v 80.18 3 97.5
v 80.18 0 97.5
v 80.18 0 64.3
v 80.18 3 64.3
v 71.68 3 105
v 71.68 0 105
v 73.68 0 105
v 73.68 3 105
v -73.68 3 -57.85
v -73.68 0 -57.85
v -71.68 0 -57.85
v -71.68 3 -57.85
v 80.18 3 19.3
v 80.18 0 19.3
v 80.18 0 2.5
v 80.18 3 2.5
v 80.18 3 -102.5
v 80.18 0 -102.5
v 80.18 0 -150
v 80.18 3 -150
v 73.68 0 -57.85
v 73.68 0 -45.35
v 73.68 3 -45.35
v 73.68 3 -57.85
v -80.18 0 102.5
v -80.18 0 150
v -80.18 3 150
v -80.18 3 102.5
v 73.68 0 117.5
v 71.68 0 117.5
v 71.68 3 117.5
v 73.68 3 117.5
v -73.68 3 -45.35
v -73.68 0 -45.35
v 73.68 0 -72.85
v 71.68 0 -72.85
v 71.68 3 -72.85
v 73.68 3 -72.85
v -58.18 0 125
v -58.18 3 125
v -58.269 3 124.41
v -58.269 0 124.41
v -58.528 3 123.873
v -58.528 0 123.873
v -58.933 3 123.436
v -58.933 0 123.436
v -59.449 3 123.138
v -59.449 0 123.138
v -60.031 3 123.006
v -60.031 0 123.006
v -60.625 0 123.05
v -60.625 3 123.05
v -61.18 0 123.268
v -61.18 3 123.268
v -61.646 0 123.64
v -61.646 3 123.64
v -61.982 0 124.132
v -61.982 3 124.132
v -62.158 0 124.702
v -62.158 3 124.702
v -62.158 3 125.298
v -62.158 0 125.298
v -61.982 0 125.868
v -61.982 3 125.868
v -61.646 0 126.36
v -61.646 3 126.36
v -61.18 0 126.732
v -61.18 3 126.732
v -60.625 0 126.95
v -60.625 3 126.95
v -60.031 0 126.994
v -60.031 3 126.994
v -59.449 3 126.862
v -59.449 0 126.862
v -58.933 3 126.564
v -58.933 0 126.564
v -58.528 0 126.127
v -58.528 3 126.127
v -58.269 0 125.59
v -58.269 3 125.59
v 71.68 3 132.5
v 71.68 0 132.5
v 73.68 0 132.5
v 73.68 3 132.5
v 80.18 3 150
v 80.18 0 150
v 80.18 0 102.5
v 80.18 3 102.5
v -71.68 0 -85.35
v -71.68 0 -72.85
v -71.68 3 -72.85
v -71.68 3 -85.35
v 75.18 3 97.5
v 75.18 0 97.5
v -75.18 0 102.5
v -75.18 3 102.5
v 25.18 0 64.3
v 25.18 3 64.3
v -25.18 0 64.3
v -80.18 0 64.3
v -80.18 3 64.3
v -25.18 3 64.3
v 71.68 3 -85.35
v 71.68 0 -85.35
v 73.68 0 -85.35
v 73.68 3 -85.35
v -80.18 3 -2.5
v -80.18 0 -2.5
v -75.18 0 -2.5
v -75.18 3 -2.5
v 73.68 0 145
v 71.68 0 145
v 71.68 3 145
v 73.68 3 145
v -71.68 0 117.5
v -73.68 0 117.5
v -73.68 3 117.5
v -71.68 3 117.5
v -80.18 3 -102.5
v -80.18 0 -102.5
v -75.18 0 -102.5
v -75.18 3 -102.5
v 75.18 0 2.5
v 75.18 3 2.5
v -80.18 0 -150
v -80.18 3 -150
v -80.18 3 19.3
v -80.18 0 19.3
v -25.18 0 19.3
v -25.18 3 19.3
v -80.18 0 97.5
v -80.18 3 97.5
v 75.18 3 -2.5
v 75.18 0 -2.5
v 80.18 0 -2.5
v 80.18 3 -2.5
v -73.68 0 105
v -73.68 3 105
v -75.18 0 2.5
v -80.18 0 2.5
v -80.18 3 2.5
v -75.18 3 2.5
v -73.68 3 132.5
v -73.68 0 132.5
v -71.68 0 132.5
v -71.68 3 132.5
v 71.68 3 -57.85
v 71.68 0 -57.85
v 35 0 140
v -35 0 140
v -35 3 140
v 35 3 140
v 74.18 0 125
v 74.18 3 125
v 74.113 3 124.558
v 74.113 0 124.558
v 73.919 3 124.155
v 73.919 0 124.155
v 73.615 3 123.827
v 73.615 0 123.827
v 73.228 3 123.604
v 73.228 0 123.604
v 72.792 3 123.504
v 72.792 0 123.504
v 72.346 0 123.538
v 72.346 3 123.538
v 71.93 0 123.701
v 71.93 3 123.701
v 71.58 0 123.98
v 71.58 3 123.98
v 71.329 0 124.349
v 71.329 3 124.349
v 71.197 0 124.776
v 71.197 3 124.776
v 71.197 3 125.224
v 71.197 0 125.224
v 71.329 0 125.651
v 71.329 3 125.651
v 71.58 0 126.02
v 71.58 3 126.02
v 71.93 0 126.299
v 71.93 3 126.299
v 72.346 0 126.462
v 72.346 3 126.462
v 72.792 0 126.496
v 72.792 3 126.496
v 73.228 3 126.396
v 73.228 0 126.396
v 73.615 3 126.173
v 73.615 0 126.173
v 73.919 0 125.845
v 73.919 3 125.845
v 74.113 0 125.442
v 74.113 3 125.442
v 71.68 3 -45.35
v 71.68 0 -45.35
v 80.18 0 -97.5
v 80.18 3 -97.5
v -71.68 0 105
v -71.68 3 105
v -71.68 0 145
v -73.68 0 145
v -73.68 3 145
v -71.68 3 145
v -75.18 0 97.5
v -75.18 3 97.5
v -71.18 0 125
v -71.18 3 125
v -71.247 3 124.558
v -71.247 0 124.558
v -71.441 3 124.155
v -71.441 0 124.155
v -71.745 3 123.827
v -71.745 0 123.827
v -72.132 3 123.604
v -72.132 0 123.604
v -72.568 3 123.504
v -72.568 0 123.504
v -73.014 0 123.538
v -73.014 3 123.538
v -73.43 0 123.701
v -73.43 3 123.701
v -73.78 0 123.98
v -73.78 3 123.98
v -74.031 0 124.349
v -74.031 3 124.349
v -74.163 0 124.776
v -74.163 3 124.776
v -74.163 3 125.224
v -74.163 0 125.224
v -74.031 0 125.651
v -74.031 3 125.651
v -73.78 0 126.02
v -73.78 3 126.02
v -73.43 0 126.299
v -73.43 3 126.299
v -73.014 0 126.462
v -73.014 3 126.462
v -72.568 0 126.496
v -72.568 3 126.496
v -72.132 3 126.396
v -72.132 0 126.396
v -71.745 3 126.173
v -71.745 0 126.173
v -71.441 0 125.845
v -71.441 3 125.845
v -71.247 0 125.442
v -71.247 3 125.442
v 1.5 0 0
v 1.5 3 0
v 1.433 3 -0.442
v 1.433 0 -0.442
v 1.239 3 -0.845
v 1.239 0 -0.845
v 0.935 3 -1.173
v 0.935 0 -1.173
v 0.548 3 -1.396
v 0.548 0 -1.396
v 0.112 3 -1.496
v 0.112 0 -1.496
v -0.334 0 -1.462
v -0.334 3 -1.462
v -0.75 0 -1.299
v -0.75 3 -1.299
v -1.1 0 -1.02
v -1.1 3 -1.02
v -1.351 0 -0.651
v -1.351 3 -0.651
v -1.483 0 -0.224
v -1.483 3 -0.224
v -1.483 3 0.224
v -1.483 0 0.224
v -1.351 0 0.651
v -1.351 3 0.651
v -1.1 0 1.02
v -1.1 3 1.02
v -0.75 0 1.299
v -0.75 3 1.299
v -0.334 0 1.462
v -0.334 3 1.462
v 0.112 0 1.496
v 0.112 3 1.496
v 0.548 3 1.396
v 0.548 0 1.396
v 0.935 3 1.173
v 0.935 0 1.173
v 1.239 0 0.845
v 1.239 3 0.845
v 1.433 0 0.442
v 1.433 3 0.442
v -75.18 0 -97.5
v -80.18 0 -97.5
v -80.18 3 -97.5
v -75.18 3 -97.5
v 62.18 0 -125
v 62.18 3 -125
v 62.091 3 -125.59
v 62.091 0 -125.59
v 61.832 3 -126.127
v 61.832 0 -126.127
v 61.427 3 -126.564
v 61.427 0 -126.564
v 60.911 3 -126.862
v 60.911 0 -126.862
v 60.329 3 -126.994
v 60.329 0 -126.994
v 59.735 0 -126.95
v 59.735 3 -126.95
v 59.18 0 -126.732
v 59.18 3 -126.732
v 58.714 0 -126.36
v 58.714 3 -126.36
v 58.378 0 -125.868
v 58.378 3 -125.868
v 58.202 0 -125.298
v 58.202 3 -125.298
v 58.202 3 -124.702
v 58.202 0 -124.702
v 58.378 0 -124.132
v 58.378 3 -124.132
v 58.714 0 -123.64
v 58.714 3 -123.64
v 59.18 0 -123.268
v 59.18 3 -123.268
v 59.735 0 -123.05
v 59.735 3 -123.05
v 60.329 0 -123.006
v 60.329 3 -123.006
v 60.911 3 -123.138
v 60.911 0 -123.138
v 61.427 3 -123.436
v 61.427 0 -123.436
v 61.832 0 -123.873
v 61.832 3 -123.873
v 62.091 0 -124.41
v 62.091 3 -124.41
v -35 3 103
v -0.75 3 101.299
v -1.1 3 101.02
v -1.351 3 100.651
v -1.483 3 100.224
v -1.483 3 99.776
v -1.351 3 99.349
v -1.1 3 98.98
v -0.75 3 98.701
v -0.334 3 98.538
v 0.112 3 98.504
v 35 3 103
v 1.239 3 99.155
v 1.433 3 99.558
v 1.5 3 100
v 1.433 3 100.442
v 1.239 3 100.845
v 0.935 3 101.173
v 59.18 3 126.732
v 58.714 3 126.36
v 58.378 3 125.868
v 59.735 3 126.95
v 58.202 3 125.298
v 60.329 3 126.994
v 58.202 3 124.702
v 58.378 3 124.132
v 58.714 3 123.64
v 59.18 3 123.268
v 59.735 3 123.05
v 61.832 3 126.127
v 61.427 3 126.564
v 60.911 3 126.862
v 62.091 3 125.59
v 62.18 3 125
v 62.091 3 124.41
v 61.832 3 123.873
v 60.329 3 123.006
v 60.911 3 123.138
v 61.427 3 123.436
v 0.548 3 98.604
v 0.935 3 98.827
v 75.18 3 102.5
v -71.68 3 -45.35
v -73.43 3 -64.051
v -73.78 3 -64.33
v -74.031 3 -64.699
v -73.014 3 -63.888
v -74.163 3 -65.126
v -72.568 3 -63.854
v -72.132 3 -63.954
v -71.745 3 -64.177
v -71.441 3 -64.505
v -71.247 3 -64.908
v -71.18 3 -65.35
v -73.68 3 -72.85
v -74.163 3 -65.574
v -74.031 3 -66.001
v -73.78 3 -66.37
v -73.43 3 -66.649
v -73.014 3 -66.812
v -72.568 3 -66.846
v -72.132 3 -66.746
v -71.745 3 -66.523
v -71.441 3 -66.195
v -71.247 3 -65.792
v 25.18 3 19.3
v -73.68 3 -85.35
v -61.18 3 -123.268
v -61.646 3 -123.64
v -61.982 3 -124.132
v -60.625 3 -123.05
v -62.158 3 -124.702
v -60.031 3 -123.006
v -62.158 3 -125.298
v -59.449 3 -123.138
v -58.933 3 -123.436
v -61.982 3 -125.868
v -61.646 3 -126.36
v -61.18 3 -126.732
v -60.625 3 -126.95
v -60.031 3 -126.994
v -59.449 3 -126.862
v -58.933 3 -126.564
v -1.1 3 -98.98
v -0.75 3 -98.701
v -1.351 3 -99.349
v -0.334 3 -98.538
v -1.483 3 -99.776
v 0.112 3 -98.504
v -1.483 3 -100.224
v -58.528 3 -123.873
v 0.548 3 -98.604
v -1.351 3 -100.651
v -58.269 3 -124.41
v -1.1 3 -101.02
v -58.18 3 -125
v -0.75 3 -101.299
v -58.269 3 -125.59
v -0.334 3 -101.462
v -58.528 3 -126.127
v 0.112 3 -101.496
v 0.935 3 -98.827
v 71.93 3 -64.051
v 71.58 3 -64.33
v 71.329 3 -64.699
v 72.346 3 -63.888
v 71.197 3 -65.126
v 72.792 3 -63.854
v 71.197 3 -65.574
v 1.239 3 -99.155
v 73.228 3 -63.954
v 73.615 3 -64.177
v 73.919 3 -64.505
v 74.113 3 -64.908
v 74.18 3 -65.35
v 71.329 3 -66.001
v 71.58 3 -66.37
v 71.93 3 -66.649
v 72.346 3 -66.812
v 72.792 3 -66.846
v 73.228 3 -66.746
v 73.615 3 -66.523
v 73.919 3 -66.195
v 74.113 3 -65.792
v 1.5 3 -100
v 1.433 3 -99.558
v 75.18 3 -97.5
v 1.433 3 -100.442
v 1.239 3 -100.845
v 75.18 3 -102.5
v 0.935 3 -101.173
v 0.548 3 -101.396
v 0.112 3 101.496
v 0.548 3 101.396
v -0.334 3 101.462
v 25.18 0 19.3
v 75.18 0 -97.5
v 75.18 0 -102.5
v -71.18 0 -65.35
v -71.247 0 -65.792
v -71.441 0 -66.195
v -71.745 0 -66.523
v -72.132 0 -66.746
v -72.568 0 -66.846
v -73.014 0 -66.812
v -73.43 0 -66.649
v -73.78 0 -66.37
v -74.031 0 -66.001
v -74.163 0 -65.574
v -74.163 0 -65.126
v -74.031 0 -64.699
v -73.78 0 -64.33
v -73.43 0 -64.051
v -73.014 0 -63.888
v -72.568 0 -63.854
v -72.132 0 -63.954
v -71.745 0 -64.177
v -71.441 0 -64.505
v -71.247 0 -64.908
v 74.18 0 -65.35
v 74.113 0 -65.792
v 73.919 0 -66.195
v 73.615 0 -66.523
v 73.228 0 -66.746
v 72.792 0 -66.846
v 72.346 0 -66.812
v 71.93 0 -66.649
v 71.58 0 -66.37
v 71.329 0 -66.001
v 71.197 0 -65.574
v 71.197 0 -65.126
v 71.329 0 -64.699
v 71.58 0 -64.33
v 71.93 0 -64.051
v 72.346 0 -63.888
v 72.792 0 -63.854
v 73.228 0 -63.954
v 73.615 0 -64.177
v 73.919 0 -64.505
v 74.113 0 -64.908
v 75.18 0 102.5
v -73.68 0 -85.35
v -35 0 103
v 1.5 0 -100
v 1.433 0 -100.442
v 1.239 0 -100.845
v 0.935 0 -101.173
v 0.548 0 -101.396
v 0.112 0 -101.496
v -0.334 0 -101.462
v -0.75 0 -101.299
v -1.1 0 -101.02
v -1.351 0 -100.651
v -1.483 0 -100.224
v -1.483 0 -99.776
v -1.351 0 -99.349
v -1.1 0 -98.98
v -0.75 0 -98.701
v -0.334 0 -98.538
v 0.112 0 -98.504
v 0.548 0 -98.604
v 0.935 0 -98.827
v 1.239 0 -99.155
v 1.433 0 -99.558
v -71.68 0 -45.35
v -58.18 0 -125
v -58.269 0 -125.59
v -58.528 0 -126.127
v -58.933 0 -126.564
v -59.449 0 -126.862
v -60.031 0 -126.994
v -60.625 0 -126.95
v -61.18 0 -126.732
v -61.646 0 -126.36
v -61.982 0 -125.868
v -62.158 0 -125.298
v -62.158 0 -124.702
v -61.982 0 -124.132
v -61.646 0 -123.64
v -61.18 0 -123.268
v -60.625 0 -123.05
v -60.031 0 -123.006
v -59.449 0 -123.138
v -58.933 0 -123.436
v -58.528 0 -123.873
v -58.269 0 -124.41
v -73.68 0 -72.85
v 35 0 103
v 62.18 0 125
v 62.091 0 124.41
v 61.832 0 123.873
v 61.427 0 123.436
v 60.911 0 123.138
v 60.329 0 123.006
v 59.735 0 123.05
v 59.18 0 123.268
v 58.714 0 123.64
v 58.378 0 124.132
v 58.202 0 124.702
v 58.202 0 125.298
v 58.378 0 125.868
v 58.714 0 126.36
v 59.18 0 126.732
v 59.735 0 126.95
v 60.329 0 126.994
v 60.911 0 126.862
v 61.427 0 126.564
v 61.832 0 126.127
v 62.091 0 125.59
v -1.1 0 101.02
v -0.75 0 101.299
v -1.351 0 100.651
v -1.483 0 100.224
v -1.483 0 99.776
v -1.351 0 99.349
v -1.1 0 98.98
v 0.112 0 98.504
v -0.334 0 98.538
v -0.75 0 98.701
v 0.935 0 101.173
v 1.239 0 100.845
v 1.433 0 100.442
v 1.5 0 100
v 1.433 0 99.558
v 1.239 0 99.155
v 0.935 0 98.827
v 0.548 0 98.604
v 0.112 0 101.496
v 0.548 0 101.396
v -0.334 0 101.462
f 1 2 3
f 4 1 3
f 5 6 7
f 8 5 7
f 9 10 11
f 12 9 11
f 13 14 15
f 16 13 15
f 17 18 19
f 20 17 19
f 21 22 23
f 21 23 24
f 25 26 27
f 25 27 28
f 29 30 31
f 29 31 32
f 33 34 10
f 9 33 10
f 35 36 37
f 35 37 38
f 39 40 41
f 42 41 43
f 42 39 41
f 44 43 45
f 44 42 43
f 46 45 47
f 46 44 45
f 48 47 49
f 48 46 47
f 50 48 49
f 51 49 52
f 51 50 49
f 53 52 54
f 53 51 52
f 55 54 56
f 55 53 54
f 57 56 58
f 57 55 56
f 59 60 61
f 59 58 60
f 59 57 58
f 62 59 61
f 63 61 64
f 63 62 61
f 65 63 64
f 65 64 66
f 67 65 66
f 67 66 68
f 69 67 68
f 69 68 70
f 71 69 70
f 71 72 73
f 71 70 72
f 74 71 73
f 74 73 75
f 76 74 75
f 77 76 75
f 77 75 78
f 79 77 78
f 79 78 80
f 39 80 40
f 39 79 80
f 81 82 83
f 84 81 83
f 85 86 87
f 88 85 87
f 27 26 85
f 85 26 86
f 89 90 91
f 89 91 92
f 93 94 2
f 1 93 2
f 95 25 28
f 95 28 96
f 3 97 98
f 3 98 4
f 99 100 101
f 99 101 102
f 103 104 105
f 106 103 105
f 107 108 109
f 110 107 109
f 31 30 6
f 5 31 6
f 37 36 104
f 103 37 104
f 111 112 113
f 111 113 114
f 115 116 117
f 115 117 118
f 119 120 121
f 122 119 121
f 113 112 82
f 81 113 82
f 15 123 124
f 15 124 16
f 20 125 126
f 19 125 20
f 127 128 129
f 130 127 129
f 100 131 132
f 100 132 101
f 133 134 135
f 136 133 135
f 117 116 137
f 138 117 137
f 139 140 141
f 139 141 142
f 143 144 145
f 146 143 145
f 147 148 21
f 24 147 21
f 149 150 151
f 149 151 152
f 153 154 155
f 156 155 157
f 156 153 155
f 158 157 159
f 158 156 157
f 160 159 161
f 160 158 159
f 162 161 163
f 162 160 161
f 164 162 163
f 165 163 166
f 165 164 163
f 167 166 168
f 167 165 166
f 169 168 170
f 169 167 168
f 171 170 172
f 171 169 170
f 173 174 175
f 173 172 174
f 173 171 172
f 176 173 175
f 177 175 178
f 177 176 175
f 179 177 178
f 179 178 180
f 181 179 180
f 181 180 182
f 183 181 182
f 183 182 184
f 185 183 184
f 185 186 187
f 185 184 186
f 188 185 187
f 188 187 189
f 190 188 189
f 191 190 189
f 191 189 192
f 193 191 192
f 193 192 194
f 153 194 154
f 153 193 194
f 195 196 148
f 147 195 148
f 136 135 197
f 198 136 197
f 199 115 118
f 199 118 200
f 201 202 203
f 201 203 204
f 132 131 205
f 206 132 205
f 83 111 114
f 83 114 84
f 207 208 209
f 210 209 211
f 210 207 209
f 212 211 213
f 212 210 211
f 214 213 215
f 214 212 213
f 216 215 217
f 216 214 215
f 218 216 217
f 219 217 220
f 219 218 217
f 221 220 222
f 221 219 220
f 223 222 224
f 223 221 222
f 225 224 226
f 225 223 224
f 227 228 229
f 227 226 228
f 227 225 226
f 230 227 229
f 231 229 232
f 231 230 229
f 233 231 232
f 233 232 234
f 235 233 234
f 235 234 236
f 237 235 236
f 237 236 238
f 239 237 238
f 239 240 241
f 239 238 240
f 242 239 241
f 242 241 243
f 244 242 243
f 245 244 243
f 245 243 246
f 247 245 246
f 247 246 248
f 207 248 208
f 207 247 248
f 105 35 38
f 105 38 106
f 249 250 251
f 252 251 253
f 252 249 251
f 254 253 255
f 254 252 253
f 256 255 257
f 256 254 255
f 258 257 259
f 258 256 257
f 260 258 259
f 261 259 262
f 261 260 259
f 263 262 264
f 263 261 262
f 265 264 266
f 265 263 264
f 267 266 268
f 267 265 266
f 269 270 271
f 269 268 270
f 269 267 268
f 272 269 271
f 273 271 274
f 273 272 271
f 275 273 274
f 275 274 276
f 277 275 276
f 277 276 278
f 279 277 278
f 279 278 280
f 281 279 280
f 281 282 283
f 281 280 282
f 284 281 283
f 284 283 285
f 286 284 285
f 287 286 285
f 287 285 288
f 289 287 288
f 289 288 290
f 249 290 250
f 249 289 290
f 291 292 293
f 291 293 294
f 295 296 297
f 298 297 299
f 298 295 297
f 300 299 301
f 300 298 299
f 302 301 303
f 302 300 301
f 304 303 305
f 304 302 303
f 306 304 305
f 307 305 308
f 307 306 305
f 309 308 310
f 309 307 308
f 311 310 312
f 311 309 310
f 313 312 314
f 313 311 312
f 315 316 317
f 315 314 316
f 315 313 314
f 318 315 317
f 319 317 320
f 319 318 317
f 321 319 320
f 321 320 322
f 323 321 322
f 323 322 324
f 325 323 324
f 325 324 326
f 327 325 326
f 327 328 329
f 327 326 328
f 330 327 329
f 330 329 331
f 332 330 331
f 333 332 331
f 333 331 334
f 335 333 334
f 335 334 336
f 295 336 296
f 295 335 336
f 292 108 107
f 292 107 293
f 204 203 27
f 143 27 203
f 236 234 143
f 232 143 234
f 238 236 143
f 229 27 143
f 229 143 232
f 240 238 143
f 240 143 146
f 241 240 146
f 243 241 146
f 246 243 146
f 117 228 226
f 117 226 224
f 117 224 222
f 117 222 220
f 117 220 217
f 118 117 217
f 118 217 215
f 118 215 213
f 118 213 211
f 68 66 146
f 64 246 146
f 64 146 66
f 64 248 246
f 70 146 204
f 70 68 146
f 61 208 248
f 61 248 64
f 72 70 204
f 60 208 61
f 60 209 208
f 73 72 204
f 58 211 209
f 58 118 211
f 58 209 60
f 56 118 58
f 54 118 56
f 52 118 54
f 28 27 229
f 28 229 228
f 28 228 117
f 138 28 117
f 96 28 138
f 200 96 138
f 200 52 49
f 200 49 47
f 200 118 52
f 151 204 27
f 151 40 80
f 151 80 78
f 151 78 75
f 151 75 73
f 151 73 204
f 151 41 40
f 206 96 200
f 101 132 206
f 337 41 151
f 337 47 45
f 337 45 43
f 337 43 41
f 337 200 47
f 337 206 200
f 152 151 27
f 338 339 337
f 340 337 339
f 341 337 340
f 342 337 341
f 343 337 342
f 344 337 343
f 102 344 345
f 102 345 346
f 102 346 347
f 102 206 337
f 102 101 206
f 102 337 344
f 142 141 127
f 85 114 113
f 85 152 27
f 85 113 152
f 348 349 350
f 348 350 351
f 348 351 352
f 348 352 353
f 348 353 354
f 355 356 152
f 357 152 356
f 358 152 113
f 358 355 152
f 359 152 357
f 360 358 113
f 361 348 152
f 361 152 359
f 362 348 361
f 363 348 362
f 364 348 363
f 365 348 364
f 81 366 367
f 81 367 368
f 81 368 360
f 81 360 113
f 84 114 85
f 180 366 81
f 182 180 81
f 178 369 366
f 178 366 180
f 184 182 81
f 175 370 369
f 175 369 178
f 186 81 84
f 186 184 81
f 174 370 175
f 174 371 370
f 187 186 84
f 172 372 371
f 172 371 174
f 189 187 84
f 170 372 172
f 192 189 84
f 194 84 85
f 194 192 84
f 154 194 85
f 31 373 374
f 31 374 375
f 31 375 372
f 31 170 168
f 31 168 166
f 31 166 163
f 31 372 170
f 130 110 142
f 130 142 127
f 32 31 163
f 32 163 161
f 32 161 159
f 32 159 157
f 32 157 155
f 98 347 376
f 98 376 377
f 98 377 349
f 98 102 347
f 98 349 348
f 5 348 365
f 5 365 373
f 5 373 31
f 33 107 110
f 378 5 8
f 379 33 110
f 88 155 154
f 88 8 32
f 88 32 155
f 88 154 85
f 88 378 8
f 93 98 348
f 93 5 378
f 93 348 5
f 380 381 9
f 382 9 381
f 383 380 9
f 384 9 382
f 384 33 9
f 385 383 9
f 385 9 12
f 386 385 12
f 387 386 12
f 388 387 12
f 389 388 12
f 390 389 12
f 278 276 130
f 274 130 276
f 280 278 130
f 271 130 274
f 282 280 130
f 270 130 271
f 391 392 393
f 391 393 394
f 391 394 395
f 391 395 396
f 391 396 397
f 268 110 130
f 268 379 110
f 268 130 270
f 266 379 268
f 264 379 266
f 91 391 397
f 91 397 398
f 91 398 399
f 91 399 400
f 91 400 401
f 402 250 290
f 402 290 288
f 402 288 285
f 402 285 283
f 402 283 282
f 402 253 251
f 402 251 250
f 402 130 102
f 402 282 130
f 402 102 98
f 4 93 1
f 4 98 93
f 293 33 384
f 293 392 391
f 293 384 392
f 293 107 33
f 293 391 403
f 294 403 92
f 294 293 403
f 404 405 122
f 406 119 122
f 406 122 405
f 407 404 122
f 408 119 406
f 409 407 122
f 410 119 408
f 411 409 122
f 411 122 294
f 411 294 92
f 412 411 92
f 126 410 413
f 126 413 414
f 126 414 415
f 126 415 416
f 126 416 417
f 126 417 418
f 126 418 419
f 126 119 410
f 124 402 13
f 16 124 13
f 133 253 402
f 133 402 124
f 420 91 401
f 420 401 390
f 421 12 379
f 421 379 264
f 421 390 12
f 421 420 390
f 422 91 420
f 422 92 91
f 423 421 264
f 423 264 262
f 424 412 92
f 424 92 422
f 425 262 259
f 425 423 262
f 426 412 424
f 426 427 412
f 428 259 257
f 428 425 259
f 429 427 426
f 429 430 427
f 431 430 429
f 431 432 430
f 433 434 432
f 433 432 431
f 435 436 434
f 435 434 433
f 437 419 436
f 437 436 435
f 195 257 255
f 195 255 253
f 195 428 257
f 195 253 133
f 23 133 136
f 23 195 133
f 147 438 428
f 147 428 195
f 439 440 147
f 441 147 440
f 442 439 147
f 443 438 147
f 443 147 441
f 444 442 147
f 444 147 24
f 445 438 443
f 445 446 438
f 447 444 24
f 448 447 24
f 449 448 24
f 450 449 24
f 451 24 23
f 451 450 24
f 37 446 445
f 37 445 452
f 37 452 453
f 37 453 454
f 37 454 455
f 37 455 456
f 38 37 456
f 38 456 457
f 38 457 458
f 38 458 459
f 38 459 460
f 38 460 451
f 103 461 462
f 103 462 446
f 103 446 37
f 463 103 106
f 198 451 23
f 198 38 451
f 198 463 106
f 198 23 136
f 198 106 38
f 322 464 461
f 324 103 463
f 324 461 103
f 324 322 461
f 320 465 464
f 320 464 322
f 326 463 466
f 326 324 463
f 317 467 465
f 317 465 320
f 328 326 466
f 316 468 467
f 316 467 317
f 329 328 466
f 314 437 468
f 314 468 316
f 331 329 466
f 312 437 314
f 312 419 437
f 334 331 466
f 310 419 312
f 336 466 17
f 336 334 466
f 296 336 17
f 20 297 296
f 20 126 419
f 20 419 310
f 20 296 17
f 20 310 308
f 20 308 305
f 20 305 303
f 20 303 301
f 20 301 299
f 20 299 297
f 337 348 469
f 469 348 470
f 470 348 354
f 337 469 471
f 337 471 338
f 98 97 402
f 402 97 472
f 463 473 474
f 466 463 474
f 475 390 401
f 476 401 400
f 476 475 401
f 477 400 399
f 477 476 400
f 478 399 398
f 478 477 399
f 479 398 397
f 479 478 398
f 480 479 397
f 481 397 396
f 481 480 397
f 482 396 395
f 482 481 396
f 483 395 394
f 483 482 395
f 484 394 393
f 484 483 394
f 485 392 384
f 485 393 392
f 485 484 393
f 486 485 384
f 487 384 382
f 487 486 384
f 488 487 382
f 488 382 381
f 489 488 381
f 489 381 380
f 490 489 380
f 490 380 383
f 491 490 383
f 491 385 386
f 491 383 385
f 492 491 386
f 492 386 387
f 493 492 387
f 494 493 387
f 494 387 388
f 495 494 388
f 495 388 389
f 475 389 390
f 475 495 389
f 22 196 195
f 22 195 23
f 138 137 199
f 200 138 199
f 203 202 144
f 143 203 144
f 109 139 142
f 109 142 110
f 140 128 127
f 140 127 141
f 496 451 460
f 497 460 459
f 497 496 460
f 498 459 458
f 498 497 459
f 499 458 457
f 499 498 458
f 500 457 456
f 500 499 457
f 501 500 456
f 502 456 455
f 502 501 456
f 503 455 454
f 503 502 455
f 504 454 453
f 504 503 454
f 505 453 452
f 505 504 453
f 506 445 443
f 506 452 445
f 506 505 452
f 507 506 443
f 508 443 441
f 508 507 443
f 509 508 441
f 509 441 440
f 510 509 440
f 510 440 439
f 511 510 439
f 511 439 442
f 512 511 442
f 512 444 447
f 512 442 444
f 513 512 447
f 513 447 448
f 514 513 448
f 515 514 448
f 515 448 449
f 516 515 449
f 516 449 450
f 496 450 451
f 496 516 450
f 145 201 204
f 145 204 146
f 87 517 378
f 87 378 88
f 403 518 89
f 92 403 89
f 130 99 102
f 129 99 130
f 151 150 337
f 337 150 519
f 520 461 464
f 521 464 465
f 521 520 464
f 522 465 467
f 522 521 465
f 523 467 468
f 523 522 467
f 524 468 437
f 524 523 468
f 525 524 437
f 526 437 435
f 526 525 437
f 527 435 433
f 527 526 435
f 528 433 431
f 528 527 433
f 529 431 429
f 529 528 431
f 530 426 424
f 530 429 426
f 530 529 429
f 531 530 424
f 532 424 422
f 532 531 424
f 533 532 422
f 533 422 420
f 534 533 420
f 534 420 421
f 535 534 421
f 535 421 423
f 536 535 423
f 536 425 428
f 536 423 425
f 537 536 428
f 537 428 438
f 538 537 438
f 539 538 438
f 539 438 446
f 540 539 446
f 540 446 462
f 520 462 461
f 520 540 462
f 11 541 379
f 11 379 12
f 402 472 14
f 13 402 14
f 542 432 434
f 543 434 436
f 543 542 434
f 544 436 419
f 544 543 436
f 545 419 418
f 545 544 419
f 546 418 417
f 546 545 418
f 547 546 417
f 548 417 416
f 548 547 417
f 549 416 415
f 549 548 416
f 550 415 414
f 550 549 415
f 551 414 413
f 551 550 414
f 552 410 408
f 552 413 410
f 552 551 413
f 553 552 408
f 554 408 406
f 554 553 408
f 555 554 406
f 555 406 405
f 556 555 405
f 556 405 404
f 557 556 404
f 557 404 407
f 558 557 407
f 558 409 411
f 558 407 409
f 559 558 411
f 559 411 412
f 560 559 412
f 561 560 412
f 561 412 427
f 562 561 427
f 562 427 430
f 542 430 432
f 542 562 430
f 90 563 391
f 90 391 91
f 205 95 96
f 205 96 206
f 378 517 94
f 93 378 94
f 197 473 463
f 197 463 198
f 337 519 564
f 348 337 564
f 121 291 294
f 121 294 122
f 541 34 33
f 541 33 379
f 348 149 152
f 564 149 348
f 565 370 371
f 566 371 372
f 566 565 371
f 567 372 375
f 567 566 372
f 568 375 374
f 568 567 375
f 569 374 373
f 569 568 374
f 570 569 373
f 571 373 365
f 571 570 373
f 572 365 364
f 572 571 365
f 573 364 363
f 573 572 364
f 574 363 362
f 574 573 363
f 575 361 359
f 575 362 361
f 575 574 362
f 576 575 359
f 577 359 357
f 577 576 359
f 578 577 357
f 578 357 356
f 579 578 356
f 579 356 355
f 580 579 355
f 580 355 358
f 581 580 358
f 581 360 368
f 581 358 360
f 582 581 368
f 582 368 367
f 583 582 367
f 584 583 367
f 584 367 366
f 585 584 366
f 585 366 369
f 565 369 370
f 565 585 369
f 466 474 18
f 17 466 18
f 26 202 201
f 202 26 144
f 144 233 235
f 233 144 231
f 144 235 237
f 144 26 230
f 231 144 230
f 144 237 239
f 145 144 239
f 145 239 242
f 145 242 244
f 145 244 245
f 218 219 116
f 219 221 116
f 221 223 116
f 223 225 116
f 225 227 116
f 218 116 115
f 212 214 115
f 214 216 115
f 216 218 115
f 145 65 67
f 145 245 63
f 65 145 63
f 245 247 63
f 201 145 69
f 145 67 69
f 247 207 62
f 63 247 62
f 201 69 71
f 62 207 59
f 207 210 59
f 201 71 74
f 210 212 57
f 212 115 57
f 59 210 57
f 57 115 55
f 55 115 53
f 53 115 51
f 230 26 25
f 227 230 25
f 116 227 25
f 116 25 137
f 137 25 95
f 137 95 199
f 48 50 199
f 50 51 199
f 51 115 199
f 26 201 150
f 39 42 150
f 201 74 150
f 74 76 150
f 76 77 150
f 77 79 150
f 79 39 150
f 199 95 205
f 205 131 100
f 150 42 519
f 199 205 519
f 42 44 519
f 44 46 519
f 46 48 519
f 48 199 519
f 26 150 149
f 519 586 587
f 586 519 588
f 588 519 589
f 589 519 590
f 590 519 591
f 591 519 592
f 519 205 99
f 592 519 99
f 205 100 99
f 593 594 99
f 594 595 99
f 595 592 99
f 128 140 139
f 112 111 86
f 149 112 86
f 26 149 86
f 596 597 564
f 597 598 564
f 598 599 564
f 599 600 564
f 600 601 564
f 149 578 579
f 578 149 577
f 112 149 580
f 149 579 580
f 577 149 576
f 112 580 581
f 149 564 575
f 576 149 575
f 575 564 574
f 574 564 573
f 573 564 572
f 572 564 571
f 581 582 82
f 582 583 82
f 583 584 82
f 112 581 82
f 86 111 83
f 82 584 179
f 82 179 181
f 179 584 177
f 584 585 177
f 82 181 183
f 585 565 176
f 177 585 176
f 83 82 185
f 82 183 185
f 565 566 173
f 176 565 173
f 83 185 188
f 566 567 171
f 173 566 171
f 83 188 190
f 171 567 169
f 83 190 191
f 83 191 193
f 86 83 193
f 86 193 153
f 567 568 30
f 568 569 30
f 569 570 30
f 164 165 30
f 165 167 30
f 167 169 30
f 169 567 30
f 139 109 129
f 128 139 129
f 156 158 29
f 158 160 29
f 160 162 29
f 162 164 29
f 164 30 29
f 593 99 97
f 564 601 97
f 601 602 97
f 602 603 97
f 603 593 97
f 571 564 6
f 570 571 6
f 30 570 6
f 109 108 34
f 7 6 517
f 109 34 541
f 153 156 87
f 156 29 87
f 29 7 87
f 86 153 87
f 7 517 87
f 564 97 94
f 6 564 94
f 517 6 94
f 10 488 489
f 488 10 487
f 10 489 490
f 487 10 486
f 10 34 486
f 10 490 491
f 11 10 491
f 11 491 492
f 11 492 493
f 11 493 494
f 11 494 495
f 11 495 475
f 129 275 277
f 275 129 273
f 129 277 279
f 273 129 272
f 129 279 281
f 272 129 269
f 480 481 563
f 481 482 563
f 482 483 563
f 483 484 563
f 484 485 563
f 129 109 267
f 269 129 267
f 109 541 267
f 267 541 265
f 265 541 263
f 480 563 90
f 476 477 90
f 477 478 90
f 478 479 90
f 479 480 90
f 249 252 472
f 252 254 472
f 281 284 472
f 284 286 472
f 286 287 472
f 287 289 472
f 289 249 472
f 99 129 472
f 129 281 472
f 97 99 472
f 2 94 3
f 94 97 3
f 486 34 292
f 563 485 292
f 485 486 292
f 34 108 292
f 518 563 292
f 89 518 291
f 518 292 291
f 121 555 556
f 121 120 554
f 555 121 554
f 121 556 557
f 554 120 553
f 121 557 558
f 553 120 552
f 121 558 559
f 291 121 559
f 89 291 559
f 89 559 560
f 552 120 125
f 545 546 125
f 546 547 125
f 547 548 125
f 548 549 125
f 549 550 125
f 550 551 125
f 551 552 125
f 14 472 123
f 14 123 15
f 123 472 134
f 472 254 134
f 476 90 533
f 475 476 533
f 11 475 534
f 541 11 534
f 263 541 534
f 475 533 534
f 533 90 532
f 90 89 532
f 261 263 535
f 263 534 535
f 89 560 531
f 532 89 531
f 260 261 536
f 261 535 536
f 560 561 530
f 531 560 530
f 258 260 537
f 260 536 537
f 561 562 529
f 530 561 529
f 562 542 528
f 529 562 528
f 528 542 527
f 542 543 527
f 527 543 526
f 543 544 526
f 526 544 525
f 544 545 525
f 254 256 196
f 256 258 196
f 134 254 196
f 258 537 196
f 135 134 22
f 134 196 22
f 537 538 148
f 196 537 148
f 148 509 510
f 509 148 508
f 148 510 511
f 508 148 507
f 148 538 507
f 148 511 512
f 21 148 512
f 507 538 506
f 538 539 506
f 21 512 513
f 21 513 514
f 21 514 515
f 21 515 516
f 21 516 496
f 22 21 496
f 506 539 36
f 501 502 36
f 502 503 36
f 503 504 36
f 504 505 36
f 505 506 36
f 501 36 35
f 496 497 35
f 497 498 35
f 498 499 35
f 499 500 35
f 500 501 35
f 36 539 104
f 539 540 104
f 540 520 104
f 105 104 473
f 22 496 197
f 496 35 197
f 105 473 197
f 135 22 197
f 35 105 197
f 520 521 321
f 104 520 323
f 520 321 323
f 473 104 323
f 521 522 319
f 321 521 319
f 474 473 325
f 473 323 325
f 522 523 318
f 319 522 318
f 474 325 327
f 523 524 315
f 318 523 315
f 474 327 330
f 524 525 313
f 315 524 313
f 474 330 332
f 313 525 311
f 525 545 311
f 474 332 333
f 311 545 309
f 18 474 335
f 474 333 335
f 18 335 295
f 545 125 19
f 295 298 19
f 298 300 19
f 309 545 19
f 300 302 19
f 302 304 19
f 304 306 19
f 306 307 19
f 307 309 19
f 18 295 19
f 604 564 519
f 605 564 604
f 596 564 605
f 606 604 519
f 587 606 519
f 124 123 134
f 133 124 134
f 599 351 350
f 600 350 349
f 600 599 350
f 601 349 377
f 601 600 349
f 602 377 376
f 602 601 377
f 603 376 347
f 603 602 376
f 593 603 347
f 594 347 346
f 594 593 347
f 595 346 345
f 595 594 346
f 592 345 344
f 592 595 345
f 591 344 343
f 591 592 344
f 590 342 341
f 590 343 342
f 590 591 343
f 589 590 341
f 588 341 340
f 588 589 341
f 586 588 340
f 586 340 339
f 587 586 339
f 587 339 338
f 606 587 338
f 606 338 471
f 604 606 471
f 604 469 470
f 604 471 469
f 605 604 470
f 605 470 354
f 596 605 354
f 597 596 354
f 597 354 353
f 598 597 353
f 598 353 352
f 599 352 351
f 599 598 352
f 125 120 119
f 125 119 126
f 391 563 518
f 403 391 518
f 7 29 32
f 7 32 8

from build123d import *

# Parameters (mm, degrees)
SCHIZZO1_W                   = 160.36
SCHIZZO1_H                   = 300
ESTRUSIONE_ESTRUSIONE1_DEPTH = 3
SCHIZZO3_R                   = 1.5
SCHIZZO3_W                   = 5
SCHIZZO3_H                   = 5
SCHIZZO3_W_2                 = 55
SCHIZZO3_H_2                 = 45
TAGLIO_ESTRUSIONE1_DEPTH     = 4
SCHIZZO4_R                   = 2
TAGLIO_ESTRUSIONE2_DEPTH     = 4
SCHIZZO5_R                   = 1.5
SCHIZZO5_W                   = 2
SCHIZZO5_H                   = 12.5
TAGLIO_ESTRUSIONE3_DEPTH     = 4
SCHIZZO6_W                   = 70
SCHIZZO6_H                   = 37
TAGLIO_ESTRUSIONE4_DEPTH     = 4


with BuildPart() as part:
    # Schizzo1 → Estrusione-Estrusione1 (new body)
    with BuildSketch(Plane(origin=(0, 0, 0), x_dir=(1, 0, 0), z_dir=(0, 1, 0))):
        Rectangle(SCHIZZO1_W, SCHIZZO1_H)
    extrude(amount=ESTRUSIONE_ESTRUSIONE1_DEPTH)

    # Schizzo3 → Taglio-Estrusione1 (cut, through all)
    with BuildSketch(Plane(origin=(0, 0, 0), x_dir=(1, 0, 0), z_dir=(0, 1, 0))):
        Circle(SCHIZZO3_R)
        with Locations((0, -100)):
            Circle(SCHIZZO3_R)
        with Locations((0, 100)):
            Circle(SCHIZZO3_R)
        with Locations((-5.042705223, -204.043249359)):
            Circle(SCHIZZO3_R)
        with Locations((-77.68, -100)):
            Rectangle(SCHIZZO3_W, SCHIZZO3_H)
        with Locations((-77.68, 0)):
            Rectangle(SCHIZZO3_W, SCHIZZO3_H)
        with Locations((-77.68, 100)):
            Rectangle(SCHIZZO3_W, SCHIZZO3_H)
        with Locations((77.68, -100)):
            Rectangle(SCHIZZO3_W, SCHIZZO3_H)
        with Locations((77.68, 0)):
            Rectangle(SCHIZZO3_W, SCHIZZO3_H)
        with Locations((77.68, 100)):
            Rectangle(SCHIZZO3_W, SCHIZZO3_H)
        with Locations((-52.68, -41.8)):
            Rectangle(SCHIZZO3_W_2, SCHIZZO3_H_2)
        with Locations((52.68, -41.8)):
            Rectangle(SCHIZZO3_W_2, SCHIZZO3_H_2)
    extrude(amount=TAGLIO_ESTRUSIONE1_DEPTH, mode=Mode.SUBTRACT)

    # Schizzo4 → Taglio-Estrusione2 (cut, through all)
    with BuildSketch(Plane(origin=(0, 0, 0), x_dir=(1, 0, 0), z_dir=(0, 1, 0))):
        with Locations((-60.18, -125)):
            Circle(SCHIZZO4_R)
        with Locations((60.18, -125)):
            Circle(SCHIZZO4_R)
        with Locations((-60.18, 125)):
            Circle(SCHIZZO4_R)
        with Locations((60.18, 125)):
            Circle(SCHIZZO4_R)
    extrude(amount=TAGLIO_ESTRUSIONE2_DEPTH, mode=Mode.SUBTRACT)

    # Schizzo5 → Taglio-Estrusione3 (cut, through all)
    with BuildSketch(Plane(origin=(0, 0, 0), x_dir=(1, 0, 0), z_dir=(0, 1, 0))):
        with Locations((72.68, 65.35)):
            Circle(SCHIZZO5_R)
        with Locations((-72.68, 65.35)):
            Circle(SCHIZZO5_R)
        with Locations((72.68, -125)):
            Circle(SCHIZZO5_R)
        with Locations((-72.68, -125)):
            Circle(SCHIZZO5_R)
        with Locations((72.68, 79.1)):
            Rectangle(SCHIZZO5_W, SCHIZZO5_H)
        with Locations((72.68, 51.6)):
            Rectangle(SCHIZZO5_W, SCHIZZO5_H)
        with Locations((-72.68, 51.6)):
            Rectangle(SCHIZZO5_W, SCHIZZO5_H)
        with Locations((-72.68, 79.1)):
            Rectangle(SCHIZZO5_W, SCHIZZO5_H)
        with Locations((72.68, -111.25)):
            Rectangle(SCHIZZO5_W, SCHIZZO5_H)
        with Locations((72.68, -138.75)):
            Rectangle(SCHIZZO5_W, SCHIZZO5_H)
        with Locations((-72.68, -111.25)):
            Rectangle(SCHIZZO5_W, SCHIZZO5_H)
        with Locations((-72.68, -138.75)):
            Rectangle(SCHIZZO5_W, SCHIZZO5_H)
    extrude(amount=TAGLIO_ESTRUSIONE3_DEPTH, mode=Mode.SUBTRACT)

    # Schizzo6 → Taglio-Estrusione4 (cut, through all)
    with BuildSketch(Plane(origin=(0, 0, 0), x_dir=(1, 0, 0), z_dir=(0, 1, 0))):
        with Locations((0, -121.5)):
            Rectangle(SCHIZZO6_W, SCHIZZO6_H)
    extrude(amount=TAGLIO_ESTRUSIONE4_DEPTH, mode=Mode.SUBTRACT)


solid = part.part
